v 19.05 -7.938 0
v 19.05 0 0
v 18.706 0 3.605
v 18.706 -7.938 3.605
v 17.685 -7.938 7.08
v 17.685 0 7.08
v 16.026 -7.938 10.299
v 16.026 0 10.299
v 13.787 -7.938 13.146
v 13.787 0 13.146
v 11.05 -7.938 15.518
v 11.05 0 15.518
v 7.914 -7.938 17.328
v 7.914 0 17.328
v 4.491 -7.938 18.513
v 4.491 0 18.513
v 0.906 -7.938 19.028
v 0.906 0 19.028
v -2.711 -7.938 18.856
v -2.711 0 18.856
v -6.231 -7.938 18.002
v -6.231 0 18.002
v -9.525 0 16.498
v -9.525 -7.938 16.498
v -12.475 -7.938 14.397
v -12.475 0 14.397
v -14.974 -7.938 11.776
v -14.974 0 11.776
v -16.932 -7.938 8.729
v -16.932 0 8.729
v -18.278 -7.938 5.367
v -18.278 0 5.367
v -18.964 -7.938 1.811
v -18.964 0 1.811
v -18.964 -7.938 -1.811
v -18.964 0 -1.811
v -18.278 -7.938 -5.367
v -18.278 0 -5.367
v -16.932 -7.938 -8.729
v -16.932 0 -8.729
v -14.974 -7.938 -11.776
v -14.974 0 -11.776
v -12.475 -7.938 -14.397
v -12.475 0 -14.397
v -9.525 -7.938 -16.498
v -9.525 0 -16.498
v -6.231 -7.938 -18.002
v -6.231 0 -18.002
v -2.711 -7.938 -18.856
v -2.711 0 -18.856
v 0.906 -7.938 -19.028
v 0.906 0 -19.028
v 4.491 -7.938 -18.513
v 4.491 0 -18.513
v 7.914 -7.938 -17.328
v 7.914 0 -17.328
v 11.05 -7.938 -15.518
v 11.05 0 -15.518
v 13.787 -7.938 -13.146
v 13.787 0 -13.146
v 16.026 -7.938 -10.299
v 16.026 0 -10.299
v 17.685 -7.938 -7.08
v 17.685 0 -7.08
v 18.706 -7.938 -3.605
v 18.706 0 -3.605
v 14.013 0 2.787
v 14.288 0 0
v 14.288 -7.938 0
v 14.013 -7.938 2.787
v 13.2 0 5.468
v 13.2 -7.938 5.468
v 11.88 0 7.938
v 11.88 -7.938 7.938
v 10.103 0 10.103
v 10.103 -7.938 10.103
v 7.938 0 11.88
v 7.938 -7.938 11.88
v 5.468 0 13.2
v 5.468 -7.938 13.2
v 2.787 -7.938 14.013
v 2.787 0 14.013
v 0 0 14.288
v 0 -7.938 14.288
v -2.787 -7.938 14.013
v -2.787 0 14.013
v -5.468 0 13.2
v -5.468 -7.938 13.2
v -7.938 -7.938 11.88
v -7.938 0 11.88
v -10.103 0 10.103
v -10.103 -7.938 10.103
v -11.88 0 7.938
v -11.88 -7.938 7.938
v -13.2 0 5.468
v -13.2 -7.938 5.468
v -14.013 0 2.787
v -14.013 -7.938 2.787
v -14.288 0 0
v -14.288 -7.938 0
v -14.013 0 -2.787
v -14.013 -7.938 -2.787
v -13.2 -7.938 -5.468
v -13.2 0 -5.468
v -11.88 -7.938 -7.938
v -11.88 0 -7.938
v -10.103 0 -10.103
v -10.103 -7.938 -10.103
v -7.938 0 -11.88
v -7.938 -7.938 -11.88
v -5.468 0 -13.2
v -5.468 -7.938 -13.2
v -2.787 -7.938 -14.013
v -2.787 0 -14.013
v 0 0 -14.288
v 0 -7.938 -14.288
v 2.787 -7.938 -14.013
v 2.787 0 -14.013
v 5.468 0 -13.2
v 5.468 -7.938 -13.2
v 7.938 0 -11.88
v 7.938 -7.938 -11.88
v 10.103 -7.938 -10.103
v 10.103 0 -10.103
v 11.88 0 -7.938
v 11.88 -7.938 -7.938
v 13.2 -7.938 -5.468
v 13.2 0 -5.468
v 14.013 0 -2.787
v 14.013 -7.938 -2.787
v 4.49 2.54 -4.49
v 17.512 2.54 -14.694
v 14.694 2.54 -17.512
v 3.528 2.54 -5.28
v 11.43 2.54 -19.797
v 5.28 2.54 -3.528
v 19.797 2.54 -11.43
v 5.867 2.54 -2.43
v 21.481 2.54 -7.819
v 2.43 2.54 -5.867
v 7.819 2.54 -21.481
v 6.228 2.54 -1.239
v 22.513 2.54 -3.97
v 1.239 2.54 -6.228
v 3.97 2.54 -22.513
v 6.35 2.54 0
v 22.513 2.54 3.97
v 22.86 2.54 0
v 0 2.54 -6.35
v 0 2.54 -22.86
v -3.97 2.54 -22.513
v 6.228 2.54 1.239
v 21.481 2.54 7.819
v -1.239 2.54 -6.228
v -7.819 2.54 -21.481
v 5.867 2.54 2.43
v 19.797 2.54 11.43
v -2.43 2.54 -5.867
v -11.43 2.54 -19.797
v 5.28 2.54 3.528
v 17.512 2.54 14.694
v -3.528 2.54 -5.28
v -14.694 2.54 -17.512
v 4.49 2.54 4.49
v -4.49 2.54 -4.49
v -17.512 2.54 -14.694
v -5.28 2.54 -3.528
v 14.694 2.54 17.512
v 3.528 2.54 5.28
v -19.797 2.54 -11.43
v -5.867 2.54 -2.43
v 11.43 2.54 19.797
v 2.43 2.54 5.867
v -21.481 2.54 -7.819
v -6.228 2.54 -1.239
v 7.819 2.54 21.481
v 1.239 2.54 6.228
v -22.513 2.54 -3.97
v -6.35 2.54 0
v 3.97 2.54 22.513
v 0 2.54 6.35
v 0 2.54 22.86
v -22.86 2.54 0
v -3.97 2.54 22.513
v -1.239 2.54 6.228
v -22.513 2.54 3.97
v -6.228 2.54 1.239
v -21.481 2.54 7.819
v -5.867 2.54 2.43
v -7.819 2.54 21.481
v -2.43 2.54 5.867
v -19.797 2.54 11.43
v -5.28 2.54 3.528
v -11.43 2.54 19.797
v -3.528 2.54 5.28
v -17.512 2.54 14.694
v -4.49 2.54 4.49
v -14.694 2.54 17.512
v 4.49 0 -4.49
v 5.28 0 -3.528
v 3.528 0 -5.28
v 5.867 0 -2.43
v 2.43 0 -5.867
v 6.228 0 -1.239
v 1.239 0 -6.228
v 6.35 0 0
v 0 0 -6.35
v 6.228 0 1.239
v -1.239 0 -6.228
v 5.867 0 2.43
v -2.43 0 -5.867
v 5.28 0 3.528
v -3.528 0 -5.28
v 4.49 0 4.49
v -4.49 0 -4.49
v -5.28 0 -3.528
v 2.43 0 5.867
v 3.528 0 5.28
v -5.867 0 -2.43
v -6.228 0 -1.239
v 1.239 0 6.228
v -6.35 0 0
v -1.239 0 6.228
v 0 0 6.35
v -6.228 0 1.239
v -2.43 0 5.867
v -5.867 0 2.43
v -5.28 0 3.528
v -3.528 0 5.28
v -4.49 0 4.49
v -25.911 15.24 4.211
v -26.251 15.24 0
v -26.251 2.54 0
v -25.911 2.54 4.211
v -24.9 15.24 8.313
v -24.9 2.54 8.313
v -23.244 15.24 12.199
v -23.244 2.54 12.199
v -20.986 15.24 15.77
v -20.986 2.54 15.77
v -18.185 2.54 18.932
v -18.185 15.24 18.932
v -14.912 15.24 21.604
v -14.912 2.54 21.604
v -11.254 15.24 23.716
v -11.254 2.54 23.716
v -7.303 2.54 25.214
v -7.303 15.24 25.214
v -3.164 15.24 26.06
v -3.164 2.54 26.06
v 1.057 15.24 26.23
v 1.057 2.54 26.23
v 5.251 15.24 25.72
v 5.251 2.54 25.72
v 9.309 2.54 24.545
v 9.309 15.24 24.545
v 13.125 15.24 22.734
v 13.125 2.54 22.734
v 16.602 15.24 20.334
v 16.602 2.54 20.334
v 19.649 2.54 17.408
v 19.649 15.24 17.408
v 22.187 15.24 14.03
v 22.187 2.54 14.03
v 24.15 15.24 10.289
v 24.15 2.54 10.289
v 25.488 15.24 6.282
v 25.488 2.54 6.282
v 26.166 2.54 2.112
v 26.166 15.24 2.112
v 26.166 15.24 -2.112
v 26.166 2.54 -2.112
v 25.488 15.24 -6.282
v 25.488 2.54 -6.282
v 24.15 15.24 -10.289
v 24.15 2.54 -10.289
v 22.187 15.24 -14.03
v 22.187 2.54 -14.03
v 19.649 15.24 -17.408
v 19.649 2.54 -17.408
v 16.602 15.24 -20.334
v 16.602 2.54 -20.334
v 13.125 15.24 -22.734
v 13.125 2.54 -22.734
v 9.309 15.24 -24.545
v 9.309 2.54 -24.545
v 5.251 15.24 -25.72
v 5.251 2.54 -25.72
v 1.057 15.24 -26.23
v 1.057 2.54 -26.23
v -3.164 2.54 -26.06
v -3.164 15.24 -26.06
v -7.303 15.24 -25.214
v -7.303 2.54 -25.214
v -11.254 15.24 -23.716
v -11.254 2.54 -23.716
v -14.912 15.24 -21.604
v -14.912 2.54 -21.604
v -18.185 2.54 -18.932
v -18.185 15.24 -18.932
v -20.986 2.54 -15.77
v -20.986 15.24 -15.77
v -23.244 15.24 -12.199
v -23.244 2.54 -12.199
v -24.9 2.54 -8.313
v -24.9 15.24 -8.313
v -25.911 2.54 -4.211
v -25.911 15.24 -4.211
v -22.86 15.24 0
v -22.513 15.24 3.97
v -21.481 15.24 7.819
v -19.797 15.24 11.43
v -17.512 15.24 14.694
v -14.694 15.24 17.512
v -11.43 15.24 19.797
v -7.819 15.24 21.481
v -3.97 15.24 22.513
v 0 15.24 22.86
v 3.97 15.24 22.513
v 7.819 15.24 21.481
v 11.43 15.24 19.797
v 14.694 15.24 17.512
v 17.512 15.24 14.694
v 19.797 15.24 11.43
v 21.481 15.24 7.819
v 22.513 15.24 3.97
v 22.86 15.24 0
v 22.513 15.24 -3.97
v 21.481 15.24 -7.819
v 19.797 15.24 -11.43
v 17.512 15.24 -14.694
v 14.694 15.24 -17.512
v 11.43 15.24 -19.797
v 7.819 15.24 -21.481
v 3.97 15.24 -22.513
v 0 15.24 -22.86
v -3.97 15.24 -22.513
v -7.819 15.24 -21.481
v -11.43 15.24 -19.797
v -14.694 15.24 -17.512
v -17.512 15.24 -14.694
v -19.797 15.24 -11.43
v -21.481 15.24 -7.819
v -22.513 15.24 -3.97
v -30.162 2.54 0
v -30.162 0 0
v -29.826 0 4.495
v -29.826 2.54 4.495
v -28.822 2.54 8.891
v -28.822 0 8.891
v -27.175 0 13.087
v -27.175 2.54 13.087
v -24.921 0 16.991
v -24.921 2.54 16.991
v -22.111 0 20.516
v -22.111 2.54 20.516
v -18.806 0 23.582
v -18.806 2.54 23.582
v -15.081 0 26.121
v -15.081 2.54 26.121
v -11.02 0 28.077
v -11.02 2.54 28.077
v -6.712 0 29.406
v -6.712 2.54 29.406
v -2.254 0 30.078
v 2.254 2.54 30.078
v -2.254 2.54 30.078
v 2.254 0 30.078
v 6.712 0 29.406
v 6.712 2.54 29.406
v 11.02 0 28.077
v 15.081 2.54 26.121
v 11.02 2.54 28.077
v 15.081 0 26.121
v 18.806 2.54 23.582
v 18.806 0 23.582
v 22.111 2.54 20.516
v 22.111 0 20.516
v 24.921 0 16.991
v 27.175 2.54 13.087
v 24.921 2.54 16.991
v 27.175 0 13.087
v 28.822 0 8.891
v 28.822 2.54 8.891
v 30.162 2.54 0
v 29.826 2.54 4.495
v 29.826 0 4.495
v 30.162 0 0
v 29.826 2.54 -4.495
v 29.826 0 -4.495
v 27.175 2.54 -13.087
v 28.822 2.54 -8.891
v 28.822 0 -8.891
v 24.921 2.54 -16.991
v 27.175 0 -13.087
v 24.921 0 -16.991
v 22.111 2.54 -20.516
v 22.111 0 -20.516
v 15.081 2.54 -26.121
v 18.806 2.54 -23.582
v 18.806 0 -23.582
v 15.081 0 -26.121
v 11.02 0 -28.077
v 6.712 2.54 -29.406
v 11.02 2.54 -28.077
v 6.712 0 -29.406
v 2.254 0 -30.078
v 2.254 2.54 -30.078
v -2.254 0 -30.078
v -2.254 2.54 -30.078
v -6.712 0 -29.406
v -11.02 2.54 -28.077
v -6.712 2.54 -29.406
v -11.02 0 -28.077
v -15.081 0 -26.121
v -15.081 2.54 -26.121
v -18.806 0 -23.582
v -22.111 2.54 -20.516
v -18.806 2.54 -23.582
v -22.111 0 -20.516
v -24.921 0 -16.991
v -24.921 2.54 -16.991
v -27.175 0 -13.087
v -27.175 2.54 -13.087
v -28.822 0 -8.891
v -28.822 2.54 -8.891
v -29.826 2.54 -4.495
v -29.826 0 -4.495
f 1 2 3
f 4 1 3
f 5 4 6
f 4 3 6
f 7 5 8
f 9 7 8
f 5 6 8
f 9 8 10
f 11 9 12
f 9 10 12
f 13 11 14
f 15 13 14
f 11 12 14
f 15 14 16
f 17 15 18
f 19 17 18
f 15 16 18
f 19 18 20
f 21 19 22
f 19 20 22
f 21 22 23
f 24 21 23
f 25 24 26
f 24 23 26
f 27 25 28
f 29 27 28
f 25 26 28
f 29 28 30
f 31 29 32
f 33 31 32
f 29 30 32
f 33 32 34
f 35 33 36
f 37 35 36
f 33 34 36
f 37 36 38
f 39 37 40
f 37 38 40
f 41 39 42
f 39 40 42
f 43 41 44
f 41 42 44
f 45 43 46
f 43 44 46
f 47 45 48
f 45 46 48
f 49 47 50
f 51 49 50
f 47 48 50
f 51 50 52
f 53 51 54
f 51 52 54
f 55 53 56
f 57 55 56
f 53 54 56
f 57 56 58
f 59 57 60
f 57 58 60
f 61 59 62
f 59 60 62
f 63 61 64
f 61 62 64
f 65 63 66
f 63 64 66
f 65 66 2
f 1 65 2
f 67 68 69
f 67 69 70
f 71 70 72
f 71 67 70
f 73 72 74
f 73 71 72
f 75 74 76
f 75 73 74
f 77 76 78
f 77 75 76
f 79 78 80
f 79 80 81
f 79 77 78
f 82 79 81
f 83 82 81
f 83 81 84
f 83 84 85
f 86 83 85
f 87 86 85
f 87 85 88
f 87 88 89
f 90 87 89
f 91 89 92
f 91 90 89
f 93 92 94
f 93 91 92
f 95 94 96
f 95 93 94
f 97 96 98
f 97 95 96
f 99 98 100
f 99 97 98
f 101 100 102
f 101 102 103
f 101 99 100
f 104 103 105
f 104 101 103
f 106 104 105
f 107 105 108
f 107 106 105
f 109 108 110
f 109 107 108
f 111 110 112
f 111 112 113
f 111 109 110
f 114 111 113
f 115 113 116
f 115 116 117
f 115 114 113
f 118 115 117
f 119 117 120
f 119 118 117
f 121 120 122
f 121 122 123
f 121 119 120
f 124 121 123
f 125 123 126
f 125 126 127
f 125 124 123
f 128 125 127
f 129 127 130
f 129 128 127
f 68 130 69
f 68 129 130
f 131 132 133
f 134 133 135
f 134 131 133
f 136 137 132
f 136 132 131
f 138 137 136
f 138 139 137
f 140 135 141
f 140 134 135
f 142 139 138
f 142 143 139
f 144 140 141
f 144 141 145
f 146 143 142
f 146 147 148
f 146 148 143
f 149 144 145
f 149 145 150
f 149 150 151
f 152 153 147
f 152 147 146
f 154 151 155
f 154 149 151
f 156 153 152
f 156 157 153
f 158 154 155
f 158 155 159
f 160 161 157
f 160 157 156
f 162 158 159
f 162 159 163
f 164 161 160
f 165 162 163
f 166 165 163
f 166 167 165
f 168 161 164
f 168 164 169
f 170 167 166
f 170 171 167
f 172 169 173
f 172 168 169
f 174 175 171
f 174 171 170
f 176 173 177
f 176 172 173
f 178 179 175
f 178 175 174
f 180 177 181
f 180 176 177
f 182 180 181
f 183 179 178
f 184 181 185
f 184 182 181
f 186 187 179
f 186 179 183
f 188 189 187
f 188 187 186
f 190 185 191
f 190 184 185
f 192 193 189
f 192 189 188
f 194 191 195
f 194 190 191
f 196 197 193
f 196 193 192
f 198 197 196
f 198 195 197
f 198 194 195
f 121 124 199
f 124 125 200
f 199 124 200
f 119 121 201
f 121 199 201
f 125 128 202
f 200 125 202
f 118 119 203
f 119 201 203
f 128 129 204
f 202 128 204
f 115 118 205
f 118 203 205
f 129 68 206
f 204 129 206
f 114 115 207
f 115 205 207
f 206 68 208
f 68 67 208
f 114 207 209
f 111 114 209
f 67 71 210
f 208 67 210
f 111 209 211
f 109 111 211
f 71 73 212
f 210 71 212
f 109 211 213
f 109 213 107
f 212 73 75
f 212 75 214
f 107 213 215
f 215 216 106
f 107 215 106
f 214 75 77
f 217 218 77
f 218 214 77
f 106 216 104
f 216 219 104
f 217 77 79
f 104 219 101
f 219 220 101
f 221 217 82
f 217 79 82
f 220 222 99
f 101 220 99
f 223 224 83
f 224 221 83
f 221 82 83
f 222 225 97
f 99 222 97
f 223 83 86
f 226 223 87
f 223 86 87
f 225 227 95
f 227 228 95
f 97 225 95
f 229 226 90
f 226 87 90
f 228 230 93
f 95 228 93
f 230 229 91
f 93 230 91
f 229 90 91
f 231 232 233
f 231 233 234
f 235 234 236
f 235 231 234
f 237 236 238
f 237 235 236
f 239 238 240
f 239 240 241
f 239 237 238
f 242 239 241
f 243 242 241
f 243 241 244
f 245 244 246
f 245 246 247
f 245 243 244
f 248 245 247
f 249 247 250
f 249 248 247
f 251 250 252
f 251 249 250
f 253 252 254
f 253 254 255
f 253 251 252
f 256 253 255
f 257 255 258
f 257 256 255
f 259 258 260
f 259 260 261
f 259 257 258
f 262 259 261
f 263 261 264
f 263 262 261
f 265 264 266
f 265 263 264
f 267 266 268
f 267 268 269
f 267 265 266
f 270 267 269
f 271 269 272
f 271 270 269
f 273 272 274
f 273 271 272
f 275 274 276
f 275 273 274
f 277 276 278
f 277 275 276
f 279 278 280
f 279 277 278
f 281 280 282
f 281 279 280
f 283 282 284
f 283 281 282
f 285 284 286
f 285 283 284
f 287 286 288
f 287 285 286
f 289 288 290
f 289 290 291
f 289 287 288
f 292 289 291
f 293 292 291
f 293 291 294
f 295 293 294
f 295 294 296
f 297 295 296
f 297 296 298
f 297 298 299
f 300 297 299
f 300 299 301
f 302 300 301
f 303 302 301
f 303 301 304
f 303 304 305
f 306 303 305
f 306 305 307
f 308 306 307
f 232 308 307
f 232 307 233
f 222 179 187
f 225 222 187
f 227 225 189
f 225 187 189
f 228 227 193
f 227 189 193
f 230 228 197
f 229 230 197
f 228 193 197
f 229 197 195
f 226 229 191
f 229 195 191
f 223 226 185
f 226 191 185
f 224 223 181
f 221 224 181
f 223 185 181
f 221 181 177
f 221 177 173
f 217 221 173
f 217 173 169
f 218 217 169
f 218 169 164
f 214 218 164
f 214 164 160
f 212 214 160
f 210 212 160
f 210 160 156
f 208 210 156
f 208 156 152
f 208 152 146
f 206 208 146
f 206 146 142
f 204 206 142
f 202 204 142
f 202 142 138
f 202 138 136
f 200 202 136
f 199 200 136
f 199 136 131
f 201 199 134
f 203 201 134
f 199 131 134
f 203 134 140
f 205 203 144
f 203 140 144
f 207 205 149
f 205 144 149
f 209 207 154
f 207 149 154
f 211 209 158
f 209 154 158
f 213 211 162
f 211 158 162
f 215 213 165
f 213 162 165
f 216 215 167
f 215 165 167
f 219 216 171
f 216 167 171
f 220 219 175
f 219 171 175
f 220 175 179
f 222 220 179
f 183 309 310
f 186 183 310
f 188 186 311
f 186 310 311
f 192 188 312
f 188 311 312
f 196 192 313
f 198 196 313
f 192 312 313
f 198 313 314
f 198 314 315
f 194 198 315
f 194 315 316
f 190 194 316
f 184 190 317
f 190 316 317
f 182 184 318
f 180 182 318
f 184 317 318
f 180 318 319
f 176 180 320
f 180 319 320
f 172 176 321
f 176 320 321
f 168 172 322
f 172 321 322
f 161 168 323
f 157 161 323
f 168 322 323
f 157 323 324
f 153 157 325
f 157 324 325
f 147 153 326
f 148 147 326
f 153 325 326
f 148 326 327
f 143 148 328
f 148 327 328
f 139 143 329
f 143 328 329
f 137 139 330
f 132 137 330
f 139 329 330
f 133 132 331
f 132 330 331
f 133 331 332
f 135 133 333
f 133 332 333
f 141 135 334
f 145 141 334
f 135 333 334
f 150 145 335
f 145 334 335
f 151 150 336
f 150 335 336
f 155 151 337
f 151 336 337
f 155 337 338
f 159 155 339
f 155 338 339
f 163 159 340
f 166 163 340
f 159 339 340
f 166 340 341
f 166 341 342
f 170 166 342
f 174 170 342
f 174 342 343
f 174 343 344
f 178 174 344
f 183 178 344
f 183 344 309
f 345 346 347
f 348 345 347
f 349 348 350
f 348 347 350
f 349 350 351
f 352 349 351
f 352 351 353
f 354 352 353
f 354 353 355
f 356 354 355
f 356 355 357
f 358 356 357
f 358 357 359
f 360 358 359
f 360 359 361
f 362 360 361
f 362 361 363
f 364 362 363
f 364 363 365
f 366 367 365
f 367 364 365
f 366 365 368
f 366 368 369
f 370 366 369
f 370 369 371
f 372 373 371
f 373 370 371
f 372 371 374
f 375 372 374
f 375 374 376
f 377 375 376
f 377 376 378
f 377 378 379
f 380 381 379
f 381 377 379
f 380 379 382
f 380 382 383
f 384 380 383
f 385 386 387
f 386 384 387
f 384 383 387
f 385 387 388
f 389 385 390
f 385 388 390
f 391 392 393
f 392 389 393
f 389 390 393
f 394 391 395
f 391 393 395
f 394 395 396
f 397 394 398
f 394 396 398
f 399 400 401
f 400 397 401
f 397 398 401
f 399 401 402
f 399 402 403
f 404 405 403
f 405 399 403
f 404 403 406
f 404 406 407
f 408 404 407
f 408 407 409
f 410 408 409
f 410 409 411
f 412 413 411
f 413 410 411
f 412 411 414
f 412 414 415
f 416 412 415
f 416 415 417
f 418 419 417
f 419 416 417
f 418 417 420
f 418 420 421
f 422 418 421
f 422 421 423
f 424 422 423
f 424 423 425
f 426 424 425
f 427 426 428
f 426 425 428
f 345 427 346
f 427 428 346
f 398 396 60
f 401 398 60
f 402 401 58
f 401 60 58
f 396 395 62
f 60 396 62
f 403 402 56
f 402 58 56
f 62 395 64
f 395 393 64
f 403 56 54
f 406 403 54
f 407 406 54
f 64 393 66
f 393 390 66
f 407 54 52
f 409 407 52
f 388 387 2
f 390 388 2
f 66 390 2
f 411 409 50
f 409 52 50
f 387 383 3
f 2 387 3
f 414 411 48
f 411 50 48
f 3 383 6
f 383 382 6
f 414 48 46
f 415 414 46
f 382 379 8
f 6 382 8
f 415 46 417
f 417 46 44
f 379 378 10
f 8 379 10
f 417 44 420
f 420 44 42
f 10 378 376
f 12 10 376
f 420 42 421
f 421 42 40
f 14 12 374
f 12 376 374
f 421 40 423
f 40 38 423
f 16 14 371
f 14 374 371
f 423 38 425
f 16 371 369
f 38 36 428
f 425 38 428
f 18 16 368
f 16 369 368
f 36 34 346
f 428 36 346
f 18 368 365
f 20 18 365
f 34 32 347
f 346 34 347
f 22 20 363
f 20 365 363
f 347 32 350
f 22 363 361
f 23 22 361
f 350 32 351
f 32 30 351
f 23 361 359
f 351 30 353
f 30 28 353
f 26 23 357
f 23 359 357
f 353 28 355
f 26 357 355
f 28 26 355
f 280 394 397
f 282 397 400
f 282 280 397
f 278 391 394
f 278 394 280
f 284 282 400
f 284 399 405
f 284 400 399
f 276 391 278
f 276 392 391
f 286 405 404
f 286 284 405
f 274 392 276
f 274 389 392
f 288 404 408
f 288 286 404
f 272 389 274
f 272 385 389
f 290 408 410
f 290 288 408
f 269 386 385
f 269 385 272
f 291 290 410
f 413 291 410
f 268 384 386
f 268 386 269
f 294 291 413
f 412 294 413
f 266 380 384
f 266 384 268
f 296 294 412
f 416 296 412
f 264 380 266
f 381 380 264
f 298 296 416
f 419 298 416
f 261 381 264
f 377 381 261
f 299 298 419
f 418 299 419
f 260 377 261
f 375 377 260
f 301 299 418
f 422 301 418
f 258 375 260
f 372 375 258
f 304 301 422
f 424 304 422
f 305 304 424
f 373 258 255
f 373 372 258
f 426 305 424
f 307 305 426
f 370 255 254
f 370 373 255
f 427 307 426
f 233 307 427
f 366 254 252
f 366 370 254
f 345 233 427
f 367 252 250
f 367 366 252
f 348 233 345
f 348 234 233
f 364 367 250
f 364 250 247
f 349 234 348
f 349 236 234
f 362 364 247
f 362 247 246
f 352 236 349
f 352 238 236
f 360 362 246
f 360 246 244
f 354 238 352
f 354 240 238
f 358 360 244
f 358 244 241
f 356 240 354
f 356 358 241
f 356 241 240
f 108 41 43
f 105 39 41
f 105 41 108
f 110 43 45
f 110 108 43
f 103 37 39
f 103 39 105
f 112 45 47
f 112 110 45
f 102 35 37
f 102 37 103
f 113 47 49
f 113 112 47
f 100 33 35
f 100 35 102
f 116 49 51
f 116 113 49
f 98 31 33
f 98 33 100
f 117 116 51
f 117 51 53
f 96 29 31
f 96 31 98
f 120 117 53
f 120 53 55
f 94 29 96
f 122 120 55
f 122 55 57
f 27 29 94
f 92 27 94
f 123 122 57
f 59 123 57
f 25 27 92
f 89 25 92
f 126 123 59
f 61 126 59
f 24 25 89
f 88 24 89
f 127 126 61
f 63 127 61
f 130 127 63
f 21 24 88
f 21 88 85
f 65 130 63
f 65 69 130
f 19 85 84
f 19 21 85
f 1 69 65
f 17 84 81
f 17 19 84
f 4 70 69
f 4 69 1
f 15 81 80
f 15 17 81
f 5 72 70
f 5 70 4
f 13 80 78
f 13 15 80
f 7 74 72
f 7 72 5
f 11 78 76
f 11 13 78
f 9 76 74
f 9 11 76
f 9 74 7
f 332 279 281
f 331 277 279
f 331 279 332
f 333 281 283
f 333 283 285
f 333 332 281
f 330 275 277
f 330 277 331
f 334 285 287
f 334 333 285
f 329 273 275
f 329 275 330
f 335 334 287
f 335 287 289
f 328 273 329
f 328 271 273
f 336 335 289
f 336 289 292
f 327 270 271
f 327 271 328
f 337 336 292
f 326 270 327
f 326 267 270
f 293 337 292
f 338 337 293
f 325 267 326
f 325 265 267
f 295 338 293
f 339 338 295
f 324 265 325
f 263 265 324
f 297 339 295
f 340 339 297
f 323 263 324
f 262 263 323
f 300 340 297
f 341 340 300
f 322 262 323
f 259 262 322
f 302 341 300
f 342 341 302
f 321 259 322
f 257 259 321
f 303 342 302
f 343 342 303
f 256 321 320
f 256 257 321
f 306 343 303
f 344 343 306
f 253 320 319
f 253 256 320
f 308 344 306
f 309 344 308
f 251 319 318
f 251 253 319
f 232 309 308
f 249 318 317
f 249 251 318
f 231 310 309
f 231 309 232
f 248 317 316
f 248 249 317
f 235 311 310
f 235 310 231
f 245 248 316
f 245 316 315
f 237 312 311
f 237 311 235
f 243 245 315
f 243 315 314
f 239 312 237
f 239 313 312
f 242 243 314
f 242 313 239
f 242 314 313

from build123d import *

# Parameters (mm, degrees)
F0_R     = 19.05
F0_R_2   = 14.2875
F1_DEPTH = 7.9375
F2_R     = 30.1625
F3_DEPTH = 15.24
F4_R     = 6.35
F5_DEPTH = 23.1785
F6_R     = 32.385
F6_R_2   = 26.2509
F7_DEPTH = 12.7
F8_R     = 22.86
F9_DEPTH = 12.7


with BuildPart() as f1:
    # F0 (on Front) → F1 (new body)
    with BuildSketch(Plane.XZ):
        Circle(F0_R)
        Circle(F0_R_2, mode=Mode.SUBTRACT)
    extrude(amount=F1_DEPTH)

    # F2 (on face) → F3 (join)
    with BuildSketch(Plane(origin=(0, 0, 0), x_dir=(-1, 0, 0), z_dir=(0, 1, 0))):
        Circle(F2_R)
    extrude(amount=F3_DEPTH)

    # F4 (on face) → F5 (cut, through all)
    with BuildSketch(Plane(origin=(0, 15.24, 0), x_dir=(-1, 0, 0), z_dir=(0, 1, 0))):
        Circle(F4_R)
    extrude(amount=-F5_DEPTH, mode=Mode.SUBTRACT)

    # F6 (on face) → F7 (cut)
    with BuildSketch(Plane(origin=(0, 15.24, 0), x_dir=(-1, 0, 0), z_dir=(0, 1, 0))):
        Circle(F6_R)
        Circle(F6_R_2, mode=Mode.SUBTRACT)
    extrude(amount=-F7_DEPTH, mode=Mode.SUBTRACT)

    # F8 (on face) → F9 (cut)
    with BuildSketch(Plane(origin=(0, 15.24, 0), x_dir=(-1, 0, 0), z_dir=(0, 1, 0))):
        Circle(F8_R)
    extrude(amount=-F9_DEPTH, mode=Mode.SUBTRACT)


solid = f1.part
